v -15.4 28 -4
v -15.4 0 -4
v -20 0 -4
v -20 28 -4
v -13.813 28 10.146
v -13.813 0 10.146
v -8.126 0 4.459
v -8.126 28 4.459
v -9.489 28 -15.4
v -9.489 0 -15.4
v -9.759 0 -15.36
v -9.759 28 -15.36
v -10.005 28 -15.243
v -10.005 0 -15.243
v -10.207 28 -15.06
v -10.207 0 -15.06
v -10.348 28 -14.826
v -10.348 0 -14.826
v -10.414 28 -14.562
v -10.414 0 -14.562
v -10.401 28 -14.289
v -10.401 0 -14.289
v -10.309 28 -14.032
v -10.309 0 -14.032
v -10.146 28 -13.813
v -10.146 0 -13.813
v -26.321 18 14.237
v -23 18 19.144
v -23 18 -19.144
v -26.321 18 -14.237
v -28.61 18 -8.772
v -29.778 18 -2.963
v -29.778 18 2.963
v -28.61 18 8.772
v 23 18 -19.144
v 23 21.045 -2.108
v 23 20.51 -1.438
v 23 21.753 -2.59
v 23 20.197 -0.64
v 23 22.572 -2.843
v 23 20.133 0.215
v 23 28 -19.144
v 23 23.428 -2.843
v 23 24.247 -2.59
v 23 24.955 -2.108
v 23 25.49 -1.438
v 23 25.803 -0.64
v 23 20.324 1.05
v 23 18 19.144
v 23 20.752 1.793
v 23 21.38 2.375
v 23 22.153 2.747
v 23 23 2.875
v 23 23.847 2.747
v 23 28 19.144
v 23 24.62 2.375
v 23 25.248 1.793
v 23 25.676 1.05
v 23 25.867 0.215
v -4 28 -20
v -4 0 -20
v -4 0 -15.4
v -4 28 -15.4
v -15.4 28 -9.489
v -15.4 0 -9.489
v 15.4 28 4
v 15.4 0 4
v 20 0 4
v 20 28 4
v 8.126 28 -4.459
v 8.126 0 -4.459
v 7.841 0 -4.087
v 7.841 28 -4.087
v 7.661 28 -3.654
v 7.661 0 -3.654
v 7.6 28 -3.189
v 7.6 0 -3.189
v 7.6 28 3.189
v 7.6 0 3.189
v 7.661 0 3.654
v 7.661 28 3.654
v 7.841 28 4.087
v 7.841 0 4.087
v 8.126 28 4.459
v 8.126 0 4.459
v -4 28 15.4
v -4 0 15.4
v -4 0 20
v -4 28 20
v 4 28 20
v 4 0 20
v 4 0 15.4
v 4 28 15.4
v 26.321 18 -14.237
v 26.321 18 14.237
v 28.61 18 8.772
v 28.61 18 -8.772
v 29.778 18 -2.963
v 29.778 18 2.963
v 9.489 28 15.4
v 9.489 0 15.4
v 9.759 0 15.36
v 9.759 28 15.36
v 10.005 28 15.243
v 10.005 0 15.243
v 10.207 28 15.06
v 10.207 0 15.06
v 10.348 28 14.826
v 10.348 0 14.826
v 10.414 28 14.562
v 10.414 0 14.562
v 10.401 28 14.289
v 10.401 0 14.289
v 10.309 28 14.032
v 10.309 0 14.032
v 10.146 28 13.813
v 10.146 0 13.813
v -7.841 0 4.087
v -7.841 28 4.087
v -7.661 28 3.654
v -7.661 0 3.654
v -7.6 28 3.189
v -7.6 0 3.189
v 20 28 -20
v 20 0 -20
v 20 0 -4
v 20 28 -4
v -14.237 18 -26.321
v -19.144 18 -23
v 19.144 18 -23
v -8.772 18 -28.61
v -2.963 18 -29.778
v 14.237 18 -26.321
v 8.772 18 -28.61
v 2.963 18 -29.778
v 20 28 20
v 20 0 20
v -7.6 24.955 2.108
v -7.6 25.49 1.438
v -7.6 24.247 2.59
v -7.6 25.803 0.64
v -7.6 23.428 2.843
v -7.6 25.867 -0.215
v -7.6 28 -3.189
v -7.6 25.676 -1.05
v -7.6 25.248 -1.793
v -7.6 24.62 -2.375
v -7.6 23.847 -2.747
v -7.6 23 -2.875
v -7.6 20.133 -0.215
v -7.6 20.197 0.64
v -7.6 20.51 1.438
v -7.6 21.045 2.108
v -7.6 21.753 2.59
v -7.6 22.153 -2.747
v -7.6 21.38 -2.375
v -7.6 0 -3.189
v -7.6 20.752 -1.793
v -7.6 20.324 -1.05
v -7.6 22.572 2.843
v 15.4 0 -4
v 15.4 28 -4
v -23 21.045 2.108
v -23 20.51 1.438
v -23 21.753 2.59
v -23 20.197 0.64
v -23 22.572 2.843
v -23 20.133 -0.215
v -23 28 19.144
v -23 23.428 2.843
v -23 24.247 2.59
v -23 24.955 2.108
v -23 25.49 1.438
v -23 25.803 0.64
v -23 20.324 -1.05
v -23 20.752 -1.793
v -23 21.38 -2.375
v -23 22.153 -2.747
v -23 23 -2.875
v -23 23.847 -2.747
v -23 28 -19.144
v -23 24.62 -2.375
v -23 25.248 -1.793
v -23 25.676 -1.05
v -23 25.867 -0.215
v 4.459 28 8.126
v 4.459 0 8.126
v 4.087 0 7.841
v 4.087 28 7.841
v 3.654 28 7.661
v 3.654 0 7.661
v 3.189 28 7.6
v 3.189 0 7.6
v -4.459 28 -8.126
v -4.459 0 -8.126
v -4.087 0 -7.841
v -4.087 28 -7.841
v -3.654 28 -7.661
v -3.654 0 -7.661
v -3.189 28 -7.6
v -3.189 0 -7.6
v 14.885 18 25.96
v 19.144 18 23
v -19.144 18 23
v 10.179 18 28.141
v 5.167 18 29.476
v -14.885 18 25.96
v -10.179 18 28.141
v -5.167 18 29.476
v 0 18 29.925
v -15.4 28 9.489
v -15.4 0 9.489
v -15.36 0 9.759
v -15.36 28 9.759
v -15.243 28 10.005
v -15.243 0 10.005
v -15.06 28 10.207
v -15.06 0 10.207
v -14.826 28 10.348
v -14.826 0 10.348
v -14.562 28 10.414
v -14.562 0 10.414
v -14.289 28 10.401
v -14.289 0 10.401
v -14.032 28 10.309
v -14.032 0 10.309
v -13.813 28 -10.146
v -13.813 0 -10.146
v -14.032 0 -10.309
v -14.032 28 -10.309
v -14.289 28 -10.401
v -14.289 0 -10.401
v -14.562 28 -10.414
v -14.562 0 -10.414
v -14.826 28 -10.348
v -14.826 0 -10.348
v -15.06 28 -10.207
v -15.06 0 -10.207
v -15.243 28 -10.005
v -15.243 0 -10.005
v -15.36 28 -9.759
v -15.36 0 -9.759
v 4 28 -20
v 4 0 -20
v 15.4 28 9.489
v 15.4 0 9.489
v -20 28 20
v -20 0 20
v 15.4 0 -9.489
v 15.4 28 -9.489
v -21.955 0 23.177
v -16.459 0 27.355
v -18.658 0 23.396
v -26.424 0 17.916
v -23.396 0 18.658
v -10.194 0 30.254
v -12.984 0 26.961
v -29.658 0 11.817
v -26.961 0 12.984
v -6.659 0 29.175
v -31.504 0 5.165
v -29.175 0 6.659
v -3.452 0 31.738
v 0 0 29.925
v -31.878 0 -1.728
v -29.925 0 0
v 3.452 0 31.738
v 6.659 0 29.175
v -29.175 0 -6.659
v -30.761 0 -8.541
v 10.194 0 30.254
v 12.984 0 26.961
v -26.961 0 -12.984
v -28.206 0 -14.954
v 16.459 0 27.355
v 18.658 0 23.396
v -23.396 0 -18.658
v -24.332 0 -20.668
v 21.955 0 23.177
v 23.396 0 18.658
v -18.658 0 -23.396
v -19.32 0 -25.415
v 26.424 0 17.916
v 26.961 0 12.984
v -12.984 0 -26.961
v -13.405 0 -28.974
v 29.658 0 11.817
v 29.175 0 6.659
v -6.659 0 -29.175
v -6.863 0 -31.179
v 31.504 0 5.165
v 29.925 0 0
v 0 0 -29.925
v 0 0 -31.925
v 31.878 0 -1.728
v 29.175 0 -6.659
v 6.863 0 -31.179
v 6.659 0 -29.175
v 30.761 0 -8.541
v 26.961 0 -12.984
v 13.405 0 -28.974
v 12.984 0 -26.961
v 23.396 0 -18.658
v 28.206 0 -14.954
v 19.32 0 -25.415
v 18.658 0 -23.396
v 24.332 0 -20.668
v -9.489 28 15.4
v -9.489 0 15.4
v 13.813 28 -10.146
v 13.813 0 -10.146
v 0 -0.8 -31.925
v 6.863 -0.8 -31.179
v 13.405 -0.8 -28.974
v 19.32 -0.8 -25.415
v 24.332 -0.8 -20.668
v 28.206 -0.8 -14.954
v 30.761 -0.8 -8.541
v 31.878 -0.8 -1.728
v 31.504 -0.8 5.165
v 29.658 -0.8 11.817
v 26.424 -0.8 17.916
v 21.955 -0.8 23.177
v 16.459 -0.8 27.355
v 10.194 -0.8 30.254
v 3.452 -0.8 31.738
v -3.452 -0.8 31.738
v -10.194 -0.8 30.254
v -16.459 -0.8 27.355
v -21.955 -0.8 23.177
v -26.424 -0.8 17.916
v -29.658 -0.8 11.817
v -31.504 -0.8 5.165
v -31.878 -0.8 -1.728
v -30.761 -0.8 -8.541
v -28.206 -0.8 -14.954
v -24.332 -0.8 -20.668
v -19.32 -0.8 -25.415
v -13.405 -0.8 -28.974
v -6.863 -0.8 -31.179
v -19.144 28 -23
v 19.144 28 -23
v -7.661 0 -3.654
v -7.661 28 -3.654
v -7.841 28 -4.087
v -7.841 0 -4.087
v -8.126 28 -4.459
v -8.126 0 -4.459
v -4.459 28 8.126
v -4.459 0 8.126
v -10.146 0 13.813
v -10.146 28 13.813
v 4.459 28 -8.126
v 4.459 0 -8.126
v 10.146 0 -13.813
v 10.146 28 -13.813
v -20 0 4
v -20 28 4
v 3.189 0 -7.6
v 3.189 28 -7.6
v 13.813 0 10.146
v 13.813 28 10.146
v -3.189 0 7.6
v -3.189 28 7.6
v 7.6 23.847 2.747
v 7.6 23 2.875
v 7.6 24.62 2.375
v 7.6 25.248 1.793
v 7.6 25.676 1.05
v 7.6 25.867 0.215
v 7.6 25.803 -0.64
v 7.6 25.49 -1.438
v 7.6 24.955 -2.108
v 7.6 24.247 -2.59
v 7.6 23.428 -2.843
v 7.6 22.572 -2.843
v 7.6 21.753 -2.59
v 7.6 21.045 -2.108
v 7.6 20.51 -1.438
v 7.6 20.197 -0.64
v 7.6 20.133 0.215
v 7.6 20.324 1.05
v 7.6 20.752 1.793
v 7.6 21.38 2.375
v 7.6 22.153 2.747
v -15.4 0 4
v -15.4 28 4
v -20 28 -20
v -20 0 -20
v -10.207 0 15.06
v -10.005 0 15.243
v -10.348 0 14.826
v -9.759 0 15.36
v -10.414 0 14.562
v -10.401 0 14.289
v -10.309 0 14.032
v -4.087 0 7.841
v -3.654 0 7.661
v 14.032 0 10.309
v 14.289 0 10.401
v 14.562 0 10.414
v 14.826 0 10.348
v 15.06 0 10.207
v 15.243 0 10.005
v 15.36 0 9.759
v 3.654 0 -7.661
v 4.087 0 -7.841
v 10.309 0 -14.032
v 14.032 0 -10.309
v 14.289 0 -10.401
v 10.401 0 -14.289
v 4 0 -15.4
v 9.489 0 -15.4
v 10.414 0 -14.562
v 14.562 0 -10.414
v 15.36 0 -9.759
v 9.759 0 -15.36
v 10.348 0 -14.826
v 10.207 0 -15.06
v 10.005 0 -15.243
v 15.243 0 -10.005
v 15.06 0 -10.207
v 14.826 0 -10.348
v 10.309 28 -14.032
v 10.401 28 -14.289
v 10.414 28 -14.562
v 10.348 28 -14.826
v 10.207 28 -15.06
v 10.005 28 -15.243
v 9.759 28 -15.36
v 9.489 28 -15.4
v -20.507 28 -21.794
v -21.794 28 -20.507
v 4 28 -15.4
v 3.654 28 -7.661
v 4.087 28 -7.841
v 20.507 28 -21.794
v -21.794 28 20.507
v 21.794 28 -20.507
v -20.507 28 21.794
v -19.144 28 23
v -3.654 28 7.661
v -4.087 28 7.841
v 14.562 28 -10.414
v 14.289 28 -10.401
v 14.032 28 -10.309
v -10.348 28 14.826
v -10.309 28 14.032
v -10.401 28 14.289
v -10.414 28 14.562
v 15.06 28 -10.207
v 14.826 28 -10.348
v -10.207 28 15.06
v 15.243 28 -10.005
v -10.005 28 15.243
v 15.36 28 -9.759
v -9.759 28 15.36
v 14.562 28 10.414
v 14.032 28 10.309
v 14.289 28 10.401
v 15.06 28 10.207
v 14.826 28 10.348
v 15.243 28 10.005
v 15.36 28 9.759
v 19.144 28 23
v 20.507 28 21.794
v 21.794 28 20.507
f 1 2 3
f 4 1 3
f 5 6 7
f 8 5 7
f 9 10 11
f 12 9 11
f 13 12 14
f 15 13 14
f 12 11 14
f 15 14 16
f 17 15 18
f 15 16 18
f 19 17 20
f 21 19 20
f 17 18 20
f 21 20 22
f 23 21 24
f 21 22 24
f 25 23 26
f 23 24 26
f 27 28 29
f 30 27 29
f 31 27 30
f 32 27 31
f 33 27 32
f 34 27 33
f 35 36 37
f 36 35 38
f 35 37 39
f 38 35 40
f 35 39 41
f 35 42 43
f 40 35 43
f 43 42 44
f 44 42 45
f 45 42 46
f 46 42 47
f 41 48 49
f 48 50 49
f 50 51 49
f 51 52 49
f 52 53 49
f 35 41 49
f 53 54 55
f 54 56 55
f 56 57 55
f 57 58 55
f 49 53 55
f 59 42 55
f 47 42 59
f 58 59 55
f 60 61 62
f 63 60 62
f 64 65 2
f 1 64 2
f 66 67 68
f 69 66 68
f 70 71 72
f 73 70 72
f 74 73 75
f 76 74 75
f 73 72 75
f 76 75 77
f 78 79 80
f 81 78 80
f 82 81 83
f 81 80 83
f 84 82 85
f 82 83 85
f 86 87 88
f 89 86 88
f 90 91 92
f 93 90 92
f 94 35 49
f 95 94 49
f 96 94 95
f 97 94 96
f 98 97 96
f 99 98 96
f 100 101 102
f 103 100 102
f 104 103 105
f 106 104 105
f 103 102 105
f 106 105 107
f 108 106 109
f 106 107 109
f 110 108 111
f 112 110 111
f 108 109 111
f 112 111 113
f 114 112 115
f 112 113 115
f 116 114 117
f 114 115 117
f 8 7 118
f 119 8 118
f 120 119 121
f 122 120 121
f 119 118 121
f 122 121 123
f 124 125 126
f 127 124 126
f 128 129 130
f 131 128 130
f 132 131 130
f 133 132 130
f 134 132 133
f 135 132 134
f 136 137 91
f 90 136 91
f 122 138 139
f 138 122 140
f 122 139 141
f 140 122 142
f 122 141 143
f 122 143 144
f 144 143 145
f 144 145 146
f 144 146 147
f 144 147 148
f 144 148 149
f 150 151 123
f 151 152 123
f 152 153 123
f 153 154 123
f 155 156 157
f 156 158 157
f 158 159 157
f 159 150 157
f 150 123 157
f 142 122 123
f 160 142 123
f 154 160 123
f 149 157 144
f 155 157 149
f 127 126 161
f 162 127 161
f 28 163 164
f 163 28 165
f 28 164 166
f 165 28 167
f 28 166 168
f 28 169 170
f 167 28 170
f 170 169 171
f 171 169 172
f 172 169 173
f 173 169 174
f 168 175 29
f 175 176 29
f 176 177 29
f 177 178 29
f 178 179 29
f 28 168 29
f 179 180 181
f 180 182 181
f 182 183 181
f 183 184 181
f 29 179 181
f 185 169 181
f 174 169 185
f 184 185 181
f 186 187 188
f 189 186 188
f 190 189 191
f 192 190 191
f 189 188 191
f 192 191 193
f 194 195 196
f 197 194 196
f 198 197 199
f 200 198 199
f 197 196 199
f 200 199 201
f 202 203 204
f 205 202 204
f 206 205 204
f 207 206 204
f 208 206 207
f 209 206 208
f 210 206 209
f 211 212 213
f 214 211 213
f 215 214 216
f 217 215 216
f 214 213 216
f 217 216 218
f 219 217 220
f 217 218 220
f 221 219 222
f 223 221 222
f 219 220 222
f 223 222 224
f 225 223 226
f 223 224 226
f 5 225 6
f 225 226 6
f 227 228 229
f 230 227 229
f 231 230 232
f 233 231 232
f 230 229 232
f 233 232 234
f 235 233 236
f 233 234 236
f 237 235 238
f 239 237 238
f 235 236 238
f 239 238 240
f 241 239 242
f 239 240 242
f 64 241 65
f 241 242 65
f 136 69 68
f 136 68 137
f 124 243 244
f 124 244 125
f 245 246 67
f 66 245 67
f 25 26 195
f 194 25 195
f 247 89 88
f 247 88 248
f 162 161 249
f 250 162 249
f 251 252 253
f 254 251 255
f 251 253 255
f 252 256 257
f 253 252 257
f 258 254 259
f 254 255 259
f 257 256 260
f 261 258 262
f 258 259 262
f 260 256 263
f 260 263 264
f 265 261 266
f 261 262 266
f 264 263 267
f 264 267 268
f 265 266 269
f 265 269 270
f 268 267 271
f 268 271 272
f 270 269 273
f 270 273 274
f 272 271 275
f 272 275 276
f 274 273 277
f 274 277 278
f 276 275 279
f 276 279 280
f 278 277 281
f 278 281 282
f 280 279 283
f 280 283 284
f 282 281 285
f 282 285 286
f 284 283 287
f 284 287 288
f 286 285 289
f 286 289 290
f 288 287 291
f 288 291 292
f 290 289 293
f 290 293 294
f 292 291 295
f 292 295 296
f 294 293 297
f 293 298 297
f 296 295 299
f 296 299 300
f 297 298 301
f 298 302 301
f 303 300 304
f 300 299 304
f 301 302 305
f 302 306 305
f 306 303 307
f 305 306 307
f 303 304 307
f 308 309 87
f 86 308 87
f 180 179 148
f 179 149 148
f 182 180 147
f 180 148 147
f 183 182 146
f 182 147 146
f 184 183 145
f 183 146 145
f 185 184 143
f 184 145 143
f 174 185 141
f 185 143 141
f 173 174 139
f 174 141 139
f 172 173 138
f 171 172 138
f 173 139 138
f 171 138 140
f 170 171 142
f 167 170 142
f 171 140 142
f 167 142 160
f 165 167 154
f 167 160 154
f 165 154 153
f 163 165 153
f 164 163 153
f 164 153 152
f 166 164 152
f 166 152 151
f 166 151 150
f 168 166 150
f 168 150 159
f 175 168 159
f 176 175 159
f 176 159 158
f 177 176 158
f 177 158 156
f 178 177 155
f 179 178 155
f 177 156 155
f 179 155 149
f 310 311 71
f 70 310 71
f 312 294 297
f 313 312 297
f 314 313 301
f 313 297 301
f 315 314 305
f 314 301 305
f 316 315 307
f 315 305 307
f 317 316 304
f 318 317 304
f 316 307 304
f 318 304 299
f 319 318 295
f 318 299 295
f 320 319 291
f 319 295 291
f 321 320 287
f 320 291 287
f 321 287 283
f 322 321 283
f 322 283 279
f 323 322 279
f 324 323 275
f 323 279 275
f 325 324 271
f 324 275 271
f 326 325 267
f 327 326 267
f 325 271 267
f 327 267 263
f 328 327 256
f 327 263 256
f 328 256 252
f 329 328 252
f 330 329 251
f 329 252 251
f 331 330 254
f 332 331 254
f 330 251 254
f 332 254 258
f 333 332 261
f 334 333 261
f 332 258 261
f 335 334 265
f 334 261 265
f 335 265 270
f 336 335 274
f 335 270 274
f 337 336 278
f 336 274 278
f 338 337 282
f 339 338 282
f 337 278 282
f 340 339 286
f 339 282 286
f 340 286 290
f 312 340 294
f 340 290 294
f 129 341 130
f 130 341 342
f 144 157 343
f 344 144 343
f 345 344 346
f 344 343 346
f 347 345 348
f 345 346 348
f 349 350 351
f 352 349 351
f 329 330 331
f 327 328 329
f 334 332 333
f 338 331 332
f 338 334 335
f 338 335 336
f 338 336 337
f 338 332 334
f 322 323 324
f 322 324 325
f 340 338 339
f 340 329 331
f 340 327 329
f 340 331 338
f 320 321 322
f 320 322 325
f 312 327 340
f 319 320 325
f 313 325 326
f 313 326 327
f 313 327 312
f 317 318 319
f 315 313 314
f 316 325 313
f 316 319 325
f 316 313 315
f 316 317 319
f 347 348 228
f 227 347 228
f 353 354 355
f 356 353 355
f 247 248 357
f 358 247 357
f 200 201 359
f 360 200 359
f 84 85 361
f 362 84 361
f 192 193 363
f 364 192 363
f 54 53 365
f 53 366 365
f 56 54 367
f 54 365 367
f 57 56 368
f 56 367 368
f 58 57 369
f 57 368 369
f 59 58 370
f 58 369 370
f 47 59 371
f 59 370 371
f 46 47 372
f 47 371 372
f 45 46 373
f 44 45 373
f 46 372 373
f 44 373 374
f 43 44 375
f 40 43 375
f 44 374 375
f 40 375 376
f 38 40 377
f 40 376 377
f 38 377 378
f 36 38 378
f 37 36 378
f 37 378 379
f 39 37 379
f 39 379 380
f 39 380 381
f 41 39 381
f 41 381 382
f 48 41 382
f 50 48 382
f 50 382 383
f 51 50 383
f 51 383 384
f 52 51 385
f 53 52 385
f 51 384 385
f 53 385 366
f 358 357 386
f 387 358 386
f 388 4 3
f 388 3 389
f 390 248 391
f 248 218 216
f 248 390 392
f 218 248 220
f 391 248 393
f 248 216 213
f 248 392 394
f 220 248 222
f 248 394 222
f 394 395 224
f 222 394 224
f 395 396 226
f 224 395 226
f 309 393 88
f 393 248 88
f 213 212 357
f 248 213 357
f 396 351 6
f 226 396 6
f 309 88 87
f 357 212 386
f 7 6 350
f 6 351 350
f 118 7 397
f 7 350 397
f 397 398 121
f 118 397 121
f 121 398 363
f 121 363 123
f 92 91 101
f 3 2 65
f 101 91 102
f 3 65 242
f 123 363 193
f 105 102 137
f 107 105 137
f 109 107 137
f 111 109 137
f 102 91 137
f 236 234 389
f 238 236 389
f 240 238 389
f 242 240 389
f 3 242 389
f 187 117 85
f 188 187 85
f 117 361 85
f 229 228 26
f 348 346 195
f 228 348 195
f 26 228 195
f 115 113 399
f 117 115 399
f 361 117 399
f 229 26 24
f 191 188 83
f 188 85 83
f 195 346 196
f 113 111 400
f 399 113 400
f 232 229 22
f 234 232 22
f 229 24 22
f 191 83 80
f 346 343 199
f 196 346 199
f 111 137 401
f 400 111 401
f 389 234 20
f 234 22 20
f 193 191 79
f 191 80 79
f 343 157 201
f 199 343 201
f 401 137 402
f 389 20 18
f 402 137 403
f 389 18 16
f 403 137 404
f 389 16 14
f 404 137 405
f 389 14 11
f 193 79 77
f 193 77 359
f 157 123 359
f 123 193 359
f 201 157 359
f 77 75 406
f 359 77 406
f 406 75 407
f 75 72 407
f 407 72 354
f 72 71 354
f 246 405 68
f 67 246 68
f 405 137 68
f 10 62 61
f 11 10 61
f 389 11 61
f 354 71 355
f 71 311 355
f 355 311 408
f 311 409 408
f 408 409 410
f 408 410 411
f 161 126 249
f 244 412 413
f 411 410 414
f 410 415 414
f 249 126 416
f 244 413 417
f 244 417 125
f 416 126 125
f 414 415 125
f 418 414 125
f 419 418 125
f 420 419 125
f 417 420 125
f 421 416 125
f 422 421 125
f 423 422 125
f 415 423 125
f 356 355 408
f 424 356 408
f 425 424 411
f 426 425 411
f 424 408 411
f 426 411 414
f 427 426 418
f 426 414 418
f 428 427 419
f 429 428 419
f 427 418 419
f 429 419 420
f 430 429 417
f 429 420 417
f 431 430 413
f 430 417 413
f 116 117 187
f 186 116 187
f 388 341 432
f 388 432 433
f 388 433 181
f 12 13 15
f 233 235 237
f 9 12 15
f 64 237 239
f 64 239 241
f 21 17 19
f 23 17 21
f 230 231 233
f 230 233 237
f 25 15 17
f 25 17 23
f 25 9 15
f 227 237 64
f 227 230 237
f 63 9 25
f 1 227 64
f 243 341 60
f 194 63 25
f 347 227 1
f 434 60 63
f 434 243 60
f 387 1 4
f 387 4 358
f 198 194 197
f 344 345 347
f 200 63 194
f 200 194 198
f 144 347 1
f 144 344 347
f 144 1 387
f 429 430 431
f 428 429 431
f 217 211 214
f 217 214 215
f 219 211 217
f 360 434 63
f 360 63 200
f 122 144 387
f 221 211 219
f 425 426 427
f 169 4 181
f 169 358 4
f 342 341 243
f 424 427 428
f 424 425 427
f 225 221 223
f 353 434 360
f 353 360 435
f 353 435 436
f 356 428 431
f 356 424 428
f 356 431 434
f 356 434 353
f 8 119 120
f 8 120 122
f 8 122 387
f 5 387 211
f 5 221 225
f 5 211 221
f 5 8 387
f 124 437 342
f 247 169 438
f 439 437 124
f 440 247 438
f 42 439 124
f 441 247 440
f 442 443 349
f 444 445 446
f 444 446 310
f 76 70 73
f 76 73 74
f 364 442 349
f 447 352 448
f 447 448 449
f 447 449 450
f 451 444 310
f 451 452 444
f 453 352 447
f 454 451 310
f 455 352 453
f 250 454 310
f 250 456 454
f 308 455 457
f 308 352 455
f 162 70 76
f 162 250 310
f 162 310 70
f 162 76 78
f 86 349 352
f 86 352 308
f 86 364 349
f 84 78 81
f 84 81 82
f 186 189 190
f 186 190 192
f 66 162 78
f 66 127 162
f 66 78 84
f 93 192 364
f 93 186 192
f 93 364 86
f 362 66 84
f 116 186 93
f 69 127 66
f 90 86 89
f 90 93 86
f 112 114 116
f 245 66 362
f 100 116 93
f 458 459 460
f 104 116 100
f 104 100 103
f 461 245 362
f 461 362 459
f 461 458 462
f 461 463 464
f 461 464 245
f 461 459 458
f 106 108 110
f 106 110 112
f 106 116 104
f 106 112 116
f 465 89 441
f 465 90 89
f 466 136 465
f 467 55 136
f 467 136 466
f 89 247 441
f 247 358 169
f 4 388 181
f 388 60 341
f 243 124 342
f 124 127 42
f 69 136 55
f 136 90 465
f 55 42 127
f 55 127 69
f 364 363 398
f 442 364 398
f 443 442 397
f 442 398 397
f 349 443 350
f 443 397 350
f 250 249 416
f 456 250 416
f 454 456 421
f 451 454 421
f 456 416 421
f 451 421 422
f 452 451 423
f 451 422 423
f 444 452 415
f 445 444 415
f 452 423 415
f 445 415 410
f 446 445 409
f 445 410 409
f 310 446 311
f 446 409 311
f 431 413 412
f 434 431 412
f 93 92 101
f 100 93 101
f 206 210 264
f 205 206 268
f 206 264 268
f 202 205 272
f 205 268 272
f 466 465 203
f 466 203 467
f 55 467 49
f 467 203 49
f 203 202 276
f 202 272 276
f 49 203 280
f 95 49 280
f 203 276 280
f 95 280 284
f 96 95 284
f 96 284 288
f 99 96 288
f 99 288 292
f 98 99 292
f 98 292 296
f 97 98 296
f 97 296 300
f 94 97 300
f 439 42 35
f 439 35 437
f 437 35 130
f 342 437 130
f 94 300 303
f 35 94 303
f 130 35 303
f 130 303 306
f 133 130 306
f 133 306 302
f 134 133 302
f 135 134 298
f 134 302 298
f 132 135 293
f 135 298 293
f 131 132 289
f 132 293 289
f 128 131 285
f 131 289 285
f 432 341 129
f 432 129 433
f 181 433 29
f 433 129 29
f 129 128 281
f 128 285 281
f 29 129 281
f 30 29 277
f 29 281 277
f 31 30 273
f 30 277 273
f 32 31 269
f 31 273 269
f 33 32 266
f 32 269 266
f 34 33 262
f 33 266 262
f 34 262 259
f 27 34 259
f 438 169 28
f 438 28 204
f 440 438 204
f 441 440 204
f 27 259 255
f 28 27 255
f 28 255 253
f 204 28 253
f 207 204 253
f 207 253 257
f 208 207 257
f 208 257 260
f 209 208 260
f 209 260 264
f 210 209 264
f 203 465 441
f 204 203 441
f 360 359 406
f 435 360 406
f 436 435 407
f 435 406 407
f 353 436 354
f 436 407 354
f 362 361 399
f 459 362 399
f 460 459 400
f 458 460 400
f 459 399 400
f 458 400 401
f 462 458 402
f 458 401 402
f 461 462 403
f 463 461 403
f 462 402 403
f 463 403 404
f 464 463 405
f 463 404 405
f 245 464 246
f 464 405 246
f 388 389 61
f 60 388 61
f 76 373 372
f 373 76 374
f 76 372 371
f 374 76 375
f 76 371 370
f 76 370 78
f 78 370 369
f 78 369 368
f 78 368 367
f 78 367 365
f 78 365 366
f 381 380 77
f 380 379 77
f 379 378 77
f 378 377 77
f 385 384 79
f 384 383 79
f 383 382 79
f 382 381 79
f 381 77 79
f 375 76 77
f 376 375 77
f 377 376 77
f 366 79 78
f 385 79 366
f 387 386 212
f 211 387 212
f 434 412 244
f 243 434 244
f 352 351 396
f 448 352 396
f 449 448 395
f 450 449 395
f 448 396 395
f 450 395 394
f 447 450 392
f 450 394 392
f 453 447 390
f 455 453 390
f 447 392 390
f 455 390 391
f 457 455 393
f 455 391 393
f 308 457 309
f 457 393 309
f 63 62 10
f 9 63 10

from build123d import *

# Parameters (mm, degrees)
SKIZZE1_R                                   = 29.925
AUFSATZ_LINEAR_AUSTRAGEN1_DEPTH             = 28
SCHNITT_LINEAR_AUSTRAGEN1_REACH             = 68.937
SKIZZE3_R                                   = 2.875
SCHNITT_LINEAR_AUSTRAGEN1_DIRECTION_2_DEPTH = 10
SKIZZE4_W                                   = 59.85
SKIZZE4_H                                   = 10
SCHNITT_LINEAR_AUSTRAGEN2_DEPTH             = 10
KREISMUSTER1_COUNT                          = 2
KREISMUSTER2_COUNT                          = 4
SKIZZE5_R                                   = 31.925
AUFSATZ_LINEAR_AUSTRAGEN2_DEPTH             = 0.8


with BuildPart() as part:
    # Skizze1 → Aufsatz-Linear austragen1 (new body)
    with BuildSketch(Plane(origin=(0, 0, 0), x_dir=(1, 0, 0), z_dir=(0, 1, 0))):
        Circle(SKIZZE1_R)
        with BuildLine():
            Line((-4, -20), (-20, -20))
            Line((-20, -20), (-20, -4))
            Line((-20, -4), (-15.4, -4))
            Line((-15.4, -4), (-15.4, -9.488825196))
            ThreePointArc((-15.4, -9.488825196), (-14.826178869, -10.347609207), (-13.813174058, -10.146110022))
            Line((-13.813174058, -10.146110022), (-8.12603127, -4.458967234))
            ThreePointArc((-8.12603127, -4.458967234), (-7.736711073, -3.876308384), (-7.6, -3.189015407))
            Line((-7.6, -3.189015407), (-7.6, 3.189015407))
            ThreePointArc((-7.6, 3.189015407), (-7.736711073, 3.876308384), (-8.12603127, 4.458967234))
            Line((-8.12603127, 4.458967234), (-13.813174058, 10.146110022))
            ThreePointArc((-13.813174058, 10.146110022), (-14.826178869, 10.347609207), (-15.4, 9.488825196))
            Line((-15.4, 9.488825196), (-15.4, 4))
            Line((-15.4, 4), (-20, 4))
            Line((-20, 4), (-20, 20))
            Line((-20, 20), (-4, 20))
            Line((-4, 20), (-4, 15.4))
            Line((-4, 15.4), (-9.488825196, 15.4))
            ThreePointArc((-9.488825196, 15.4), (-10.347609207, 14.826178869), (-10.146110022, 13.813174058))
            Line((-10.146110022, 13.813174058), (-4.458967234, 8.12603127))
            ThreePointArc((-4.458967234, 8.12603127), (-3.876308384, 7.736711073), (-3.189015407, 7.6))
            Line((-3.189015407, 7.6), (3.189015407, 7.6))
            ThreePointArc((3.189015407, 7.6), (3.876308384, 7.736711073), (4.458967234, 8.12603127))
            Line((4.458967234, 8.12603127), (10.146110022, 13.813174058))
            ThreePointArc((10.146110022, 13.813174058), (10.347609207, 14.826178869), (9.488825196, 15.4))
            Line((9.488825196, 15.4), (4, 15.4))
            Line((4, 15.4), (4, 20))
            Line((4, 20), (20, 20))
            Line((20, 20), (20, 4))
            Line((20, 4), (15.4, 4))
            Line((15.4, 4), (15.4, 9.488825196))
            ThreePointArc((15.4, 9.488825196), (14.826178869, 10.347609207), (13.813174058, 10.146110022))
            Line((13.813174058, 10.146110022), (8.12603127, 4.458967234))
            ThreePointArc((8.12603127, 4.458967234), (7.736711073, 3.876308384), (7.6, 3.189015407))
            Line((7.6, 3.189015407), (7.6, -3.189015407))
            ThreePointArc((7.6, -3.189015407), (7.736711073, -3.876308384), (8.12603127, -4.458967234))
            Line((8.12603127, -4.458967234), (13.813174058, -10.146110022))
            ThreePointArc((13.813174058, -10.146110022), (14.826178869, -10.347609207), (15.4, -9.488825196))
            Line((15.4, -9.488825196), (15.4, -4))
            Line((15.4, -4), (20, -4))
            Line((20, -4), (20, -20))
            Line((20, -20), (4, -20))
            Line((4, -20), (4, -15.4))
            Line((4, -15.4), (9.488825196, -15.4))
            ThreePointArc((9.488825196, -15.4), (10.347609207, -14.826178869), (10.146110022, -13.813174058))
            Line((10.146110022, -13.813174058), (4.458967234, -8.12603127))
            ThreePointArc((4.458967234, -8.12603127), (3.876308384, -7.736711073), (3.189015407, -7.6))
            Line((3.189015407, -7.6), (-3.189015407, -7.6))
            ThreePointArc((-3.189015407, -7.6), (-3.876308384, -7.736711073), (-4.458967234, -8.12603127))
            Line((-4.458967234, -8.12603127), (-10.146110022, -13.813174058))
            ThreePointArc((-10.146110022, -13.813174058), (-10.347609207, -14.826178869), (-9.488825196, -15.4))
            Line((-9.488825196, -15.4), (-4, -15.4))
            Line((-4, -15.4), (-4, -20))
        make_face(mode=Mode.SUBTRACT)
    extrude(amount=AUFSATZ_LINEAR_AUSTRAGEN1_DEPTH)

    # Skizze3 → Schnitt-Linear austragen1 (cut, up to next)
    with BuildSketch(Plane.ZY.offset(-23), mode=Mode.PRIVATE) as schnitt_linear_austragen1_sk1:
        with Locations((0, 23)):
            Circle(SKIZZE3_R)
    schnitt_linear_austragen1_tool1 = extrude(schnitt_linear_austragen1_sk1.sketch, amount=SCHNITT_LINEAR_AUSTRAGEN1_REACH, mode=Mode.PRIVATE) & part.part
    schnitt_linear_austragen1 = schnitt_linear_austragen1_tool1.solids().sort_by_distance((23, 23, 0))[0]
    add(schnitt_linear_austragen1, mode=Mode.SUBTRACT)

    # Skizze3 → Schnitt-Linear austragen1 direction 2 (cut)
    with BuildSketch(Plane.ZY.offset(-23)):
        with Locations((0, 23)):
            Circle(SKIZZE3_R)
    schnitt_linear_austragen1_direction_2 = extrude(amount=-SCHNITT_LINEAR_AUSTRAGEN1_DIRECTION_2_DEPTH, mode=Mode.SUBTRACT)

    # Skizze4 → Schnitt-Linear austragen2 (cut)
    with BuildSketch(Plane.ZY.offset(-23)):
        with Locations((0, 23)):
            Rectangle(SKIZZE4_W, SKIZZE4_H)
    schnitt_linear_austragen2 = extrude(amount=-SCHNITT_LINEAR_AUSTRAGEN2_DEPTH, mode=Mode.SUBTRACT)

    # Kreismuster1: Schnitt-Linear austragen1, Schnitt-Linear austragen1 direction 2 ×2 about axis
    kreismuster1_axis = Axis((0, 28, 0), (0, -1, 0))
    add([schnitt_linear_austragen1.rotate(kreismuster1_axis, i * 360 / KREISMUSTER1_COUNT) for i in range(1, KREISMUSTER1_COUNT)], mode=Mode.SUBTRACT)
    add([schnitt_linear_austragen1_direction_2.rotate(kreismuster1_axis, i * 360 / KREISMUSTER1_COUNT) for i in range(1, KREISMUSTER1_COUNT)], mode=Mode.SUBTRACT)

    # Kreismuster2: Schnitt-Linear austragen2 ×4 about axis
    kreismuster2_axis = Axis((0, 28, 0), (0, -1, 0))
    for i in range(1, KREISMUSTER2_COUNT):
        add(schnitt_linear_austragen2.rotate(kreismuster2_axis, i * 360 / KREISMUSTER2_COUNT), mode=Mode.SUBTRACT)

    # Skizze5 → Aufsatz-Linear austragen2 (add)
    with BuildSketch(Plane.XZ):
        Circle(SKIZZE5_R)
    extrude(amount=AUFSATZ_LINEAR_AUSTRAGEN2_DEPTH)


solid = part.part
